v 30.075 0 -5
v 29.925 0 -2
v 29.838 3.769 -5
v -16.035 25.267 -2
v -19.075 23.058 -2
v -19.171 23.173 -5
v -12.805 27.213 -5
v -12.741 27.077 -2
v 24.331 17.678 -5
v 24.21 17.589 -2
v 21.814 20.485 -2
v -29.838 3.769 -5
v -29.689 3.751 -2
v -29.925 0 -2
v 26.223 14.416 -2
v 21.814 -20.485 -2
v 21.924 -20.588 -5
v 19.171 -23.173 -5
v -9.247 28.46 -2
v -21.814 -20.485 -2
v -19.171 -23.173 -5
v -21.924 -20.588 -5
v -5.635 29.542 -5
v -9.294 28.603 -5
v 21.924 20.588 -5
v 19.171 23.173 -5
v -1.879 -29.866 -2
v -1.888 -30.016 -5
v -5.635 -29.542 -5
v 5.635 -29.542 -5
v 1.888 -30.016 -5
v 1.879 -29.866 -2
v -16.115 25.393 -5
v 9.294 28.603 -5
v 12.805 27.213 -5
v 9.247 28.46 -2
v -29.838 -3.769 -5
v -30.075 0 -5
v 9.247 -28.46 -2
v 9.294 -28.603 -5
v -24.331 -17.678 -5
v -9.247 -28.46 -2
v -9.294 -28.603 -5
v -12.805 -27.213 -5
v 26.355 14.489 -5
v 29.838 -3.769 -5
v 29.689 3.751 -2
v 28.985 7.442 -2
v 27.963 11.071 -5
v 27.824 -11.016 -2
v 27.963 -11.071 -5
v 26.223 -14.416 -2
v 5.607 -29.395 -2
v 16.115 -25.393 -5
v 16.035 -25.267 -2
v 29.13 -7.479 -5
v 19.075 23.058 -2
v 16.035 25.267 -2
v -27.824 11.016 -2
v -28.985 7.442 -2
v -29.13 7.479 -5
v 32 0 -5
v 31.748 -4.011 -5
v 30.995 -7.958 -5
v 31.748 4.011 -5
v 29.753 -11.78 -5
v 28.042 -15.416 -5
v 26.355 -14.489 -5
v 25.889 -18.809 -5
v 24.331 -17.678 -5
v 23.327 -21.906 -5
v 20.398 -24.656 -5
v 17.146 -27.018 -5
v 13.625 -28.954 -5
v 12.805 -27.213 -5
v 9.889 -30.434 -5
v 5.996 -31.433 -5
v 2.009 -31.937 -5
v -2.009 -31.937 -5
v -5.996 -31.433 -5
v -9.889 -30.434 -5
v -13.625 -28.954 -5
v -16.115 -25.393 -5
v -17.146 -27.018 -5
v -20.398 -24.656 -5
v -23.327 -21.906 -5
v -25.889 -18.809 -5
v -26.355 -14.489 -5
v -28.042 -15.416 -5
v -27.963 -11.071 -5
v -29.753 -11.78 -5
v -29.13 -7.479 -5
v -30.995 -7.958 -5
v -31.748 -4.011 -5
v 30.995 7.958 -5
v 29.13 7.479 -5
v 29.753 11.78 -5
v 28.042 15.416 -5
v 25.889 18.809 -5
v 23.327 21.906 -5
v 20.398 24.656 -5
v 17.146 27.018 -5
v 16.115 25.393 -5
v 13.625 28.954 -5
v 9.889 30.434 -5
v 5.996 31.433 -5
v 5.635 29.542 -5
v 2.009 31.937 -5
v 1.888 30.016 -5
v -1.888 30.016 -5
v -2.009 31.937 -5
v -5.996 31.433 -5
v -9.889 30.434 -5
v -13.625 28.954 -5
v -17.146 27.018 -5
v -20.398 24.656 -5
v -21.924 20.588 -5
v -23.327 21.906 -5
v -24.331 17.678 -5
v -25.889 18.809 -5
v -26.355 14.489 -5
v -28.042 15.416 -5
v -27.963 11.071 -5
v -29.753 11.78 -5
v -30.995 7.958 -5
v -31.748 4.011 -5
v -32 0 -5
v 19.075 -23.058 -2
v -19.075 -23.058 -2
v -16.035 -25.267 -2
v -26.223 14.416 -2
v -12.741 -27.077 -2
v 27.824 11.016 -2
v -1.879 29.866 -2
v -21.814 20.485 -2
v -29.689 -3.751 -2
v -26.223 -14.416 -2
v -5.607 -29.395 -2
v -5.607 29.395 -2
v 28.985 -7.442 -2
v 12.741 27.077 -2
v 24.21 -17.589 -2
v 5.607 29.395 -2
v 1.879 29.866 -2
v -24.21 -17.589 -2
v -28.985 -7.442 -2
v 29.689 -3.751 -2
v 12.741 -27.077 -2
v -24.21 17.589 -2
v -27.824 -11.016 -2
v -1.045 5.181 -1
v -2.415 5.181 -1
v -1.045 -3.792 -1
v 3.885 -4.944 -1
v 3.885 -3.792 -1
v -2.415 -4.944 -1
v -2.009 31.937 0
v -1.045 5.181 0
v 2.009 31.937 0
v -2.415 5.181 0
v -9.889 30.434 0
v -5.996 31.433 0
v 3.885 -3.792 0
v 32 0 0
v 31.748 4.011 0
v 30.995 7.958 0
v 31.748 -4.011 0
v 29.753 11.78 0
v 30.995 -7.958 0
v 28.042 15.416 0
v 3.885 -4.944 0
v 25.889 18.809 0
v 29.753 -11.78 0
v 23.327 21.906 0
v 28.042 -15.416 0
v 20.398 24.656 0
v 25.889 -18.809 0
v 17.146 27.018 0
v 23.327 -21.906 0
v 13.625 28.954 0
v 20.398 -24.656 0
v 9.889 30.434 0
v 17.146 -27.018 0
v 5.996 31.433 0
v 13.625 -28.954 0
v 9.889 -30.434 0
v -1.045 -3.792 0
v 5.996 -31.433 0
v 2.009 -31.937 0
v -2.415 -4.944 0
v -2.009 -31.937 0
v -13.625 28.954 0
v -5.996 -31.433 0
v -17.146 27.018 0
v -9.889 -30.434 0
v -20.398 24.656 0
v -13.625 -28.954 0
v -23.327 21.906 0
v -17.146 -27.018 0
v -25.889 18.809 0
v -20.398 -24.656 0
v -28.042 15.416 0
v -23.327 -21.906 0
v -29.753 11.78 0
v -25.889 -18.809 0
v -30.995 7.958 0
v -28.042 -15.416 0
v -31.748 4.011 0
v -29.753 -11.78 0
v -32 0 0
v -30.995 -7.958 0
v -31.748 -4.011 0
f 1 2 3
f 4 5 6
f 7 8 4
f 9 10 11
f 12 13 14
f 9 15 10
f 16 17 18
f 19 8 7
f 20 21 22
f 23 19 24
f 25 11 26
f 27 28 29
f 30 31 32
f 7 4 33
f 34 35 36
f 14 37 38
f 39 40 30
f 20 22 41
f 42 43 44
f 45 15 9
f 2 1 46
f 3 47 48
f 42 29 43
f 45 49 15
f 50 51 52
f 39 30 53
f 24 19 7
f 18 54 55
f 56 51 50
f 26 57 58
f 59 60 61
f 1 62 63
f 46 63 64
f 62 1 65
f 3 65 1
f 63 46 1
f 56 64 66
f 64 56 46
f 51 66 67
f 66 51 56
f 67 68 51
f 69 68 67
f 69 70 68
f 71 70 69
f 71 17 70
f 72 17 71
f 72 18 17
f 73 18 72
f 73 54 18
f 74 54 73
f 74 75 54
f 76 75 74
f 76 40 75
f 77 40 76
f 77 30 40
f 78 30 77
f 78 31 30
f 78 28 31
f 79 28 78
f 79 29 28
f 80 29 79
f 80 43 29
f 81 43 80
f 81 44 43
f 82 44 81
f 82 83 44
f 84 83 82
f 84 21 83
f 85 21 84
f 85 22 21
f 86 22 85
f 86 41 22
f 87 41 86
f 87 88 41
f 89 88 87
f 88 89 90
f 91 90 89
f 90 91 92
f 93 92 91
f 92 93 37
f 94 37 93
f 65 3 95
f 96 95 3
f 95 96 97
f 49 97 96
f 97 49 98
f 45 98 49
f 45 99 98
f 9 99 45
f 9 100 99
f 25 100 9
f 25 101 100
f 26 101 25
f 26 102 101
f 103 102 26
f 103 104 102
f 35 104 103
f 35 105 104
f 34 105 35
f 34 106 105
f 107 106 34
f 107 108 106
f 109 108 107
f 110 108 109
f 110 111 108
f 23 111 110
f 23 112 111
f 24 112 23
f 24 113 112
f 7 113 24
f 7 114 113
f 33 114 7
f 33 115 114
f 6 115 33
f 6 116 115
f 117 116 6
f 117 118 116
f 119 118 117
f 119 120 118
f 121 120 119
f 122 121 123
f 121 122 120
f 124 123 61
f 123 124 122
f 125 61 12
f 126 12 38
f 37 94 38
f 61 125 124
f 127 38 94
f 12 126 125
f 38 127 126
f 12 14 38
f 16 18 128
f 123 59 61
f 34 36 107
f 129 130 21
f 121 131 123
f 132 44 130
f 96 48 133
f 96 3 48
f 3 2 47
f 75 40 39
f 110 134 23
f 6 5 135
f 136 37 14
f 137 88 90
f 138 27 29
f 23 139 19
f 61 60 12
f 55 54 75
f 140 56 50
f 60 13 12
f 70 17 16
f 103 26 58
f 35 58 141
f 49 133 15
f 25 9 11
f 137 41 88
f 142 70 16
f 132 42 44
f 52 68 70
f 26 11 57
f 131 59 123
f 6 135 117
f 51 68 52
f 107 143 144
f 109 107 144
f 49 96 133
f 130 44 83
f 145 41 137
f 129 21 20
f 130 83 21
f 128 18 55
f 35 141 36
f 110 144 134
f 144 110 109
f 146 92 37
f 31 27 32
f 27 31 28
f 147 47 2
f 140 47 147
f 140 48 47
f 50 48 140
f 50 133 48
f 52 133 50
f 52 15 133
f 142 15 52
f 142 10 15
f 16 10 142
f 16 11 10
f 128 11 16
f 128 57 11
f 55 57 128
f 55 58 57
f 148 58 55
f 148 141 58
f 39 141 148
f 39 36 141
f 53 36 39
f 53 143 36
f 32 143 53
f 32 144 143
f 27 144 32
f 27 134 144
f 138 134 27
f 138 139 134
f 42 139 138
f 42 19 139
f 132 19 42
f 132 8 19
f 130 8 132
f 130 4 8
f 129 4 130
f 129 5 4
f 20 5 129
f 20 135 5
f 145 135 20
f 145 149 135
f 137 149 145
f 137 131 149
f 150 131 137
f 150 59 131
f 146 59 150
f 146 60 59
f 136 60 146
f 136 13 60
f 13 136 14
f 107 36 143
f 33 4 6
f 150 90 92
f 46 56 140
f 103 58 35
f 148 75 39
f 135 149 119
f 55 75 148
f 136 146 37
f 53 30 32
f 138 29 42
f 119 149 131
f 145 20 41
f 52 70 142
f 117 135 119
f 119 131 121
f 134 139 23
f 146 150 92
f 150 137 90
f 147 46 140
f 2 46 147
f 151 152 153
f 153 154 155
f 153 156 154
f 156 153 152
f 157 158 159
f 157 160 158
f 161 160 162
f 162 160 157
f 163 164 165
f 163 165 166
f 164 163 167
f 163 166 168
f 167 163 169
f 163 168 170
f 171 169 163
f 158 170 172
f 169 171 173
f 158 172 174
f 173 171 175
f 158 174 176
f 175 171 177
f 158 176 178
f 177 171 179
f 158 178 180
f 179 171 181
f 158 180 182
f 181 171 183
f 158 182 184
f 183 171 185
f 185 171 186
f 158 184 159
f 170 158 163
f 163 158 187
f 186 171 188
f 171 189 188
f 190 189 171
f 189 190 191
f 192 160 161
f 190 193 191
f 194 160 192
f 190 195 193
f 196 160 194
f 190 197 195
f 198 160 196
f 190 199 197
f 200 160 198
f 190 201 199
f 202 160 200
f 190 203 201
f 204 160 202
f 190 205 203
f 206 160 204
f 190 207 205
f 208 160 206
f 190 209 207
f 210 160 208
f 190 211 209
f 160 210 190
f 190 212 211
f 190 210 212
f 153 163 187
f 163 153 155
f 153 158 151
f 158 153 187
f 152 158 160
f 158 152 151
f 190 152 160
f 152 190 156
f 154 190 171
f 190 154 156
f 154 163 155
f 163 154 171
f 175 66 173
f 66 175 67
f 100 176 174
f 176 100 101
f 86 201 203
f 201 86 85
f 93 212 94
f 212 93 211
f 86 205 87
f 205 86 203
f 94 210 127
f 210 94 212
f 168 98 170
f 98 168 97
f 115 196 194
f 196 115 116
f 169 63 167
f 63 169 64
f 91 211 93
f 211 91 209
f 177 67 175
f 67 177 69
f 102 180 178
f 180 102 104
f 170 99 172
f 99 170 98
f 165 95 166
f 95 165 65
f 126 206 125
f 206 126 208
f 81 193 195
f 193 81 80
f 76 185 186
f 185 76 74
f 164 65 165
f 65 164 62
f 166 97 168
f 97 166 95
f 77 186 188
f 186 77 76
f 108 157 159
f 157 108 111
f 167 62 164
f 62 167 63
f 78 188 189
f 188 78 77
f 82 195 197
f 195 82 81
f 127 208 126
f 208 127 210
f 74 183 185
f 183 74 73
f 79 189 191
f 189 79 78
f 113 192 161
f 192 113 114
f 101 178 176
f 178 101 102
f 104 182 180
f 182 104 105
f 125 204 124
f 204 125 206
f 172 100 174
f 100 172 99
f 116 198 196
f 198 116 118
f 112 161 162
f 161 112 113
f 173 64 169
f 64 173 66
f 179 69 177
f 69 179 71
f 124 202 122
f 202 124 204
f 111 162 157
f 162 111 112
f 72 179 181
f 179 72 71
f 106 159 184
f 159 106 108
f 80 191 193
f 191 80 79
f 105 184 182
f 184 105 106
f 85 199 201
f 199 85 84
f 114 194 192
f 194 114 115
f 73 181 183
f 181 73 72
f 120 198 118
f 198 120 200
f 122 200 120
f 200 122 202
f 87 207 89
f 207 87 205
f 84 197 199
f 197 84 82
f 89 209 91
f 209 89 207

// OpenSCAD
$fn = 50;

difference() {
	union() {
		translate(v = [0, 0, -5.0]) {
			cylinder(h = 5, r = 32.0);
		}
	}
	union() {
		#translate(v = [0, 0, -5.0]) {
			cylinder(h = 3, r1 = 30.075, r2 = 29.925);
		}
		translate(v = [0, 0, -1]) {
			linear_extrude(height = 1) {
				text(font = "Impact", halign = "center", size = 10, text = "L", valign = "center");
			}
		}
	}
}
